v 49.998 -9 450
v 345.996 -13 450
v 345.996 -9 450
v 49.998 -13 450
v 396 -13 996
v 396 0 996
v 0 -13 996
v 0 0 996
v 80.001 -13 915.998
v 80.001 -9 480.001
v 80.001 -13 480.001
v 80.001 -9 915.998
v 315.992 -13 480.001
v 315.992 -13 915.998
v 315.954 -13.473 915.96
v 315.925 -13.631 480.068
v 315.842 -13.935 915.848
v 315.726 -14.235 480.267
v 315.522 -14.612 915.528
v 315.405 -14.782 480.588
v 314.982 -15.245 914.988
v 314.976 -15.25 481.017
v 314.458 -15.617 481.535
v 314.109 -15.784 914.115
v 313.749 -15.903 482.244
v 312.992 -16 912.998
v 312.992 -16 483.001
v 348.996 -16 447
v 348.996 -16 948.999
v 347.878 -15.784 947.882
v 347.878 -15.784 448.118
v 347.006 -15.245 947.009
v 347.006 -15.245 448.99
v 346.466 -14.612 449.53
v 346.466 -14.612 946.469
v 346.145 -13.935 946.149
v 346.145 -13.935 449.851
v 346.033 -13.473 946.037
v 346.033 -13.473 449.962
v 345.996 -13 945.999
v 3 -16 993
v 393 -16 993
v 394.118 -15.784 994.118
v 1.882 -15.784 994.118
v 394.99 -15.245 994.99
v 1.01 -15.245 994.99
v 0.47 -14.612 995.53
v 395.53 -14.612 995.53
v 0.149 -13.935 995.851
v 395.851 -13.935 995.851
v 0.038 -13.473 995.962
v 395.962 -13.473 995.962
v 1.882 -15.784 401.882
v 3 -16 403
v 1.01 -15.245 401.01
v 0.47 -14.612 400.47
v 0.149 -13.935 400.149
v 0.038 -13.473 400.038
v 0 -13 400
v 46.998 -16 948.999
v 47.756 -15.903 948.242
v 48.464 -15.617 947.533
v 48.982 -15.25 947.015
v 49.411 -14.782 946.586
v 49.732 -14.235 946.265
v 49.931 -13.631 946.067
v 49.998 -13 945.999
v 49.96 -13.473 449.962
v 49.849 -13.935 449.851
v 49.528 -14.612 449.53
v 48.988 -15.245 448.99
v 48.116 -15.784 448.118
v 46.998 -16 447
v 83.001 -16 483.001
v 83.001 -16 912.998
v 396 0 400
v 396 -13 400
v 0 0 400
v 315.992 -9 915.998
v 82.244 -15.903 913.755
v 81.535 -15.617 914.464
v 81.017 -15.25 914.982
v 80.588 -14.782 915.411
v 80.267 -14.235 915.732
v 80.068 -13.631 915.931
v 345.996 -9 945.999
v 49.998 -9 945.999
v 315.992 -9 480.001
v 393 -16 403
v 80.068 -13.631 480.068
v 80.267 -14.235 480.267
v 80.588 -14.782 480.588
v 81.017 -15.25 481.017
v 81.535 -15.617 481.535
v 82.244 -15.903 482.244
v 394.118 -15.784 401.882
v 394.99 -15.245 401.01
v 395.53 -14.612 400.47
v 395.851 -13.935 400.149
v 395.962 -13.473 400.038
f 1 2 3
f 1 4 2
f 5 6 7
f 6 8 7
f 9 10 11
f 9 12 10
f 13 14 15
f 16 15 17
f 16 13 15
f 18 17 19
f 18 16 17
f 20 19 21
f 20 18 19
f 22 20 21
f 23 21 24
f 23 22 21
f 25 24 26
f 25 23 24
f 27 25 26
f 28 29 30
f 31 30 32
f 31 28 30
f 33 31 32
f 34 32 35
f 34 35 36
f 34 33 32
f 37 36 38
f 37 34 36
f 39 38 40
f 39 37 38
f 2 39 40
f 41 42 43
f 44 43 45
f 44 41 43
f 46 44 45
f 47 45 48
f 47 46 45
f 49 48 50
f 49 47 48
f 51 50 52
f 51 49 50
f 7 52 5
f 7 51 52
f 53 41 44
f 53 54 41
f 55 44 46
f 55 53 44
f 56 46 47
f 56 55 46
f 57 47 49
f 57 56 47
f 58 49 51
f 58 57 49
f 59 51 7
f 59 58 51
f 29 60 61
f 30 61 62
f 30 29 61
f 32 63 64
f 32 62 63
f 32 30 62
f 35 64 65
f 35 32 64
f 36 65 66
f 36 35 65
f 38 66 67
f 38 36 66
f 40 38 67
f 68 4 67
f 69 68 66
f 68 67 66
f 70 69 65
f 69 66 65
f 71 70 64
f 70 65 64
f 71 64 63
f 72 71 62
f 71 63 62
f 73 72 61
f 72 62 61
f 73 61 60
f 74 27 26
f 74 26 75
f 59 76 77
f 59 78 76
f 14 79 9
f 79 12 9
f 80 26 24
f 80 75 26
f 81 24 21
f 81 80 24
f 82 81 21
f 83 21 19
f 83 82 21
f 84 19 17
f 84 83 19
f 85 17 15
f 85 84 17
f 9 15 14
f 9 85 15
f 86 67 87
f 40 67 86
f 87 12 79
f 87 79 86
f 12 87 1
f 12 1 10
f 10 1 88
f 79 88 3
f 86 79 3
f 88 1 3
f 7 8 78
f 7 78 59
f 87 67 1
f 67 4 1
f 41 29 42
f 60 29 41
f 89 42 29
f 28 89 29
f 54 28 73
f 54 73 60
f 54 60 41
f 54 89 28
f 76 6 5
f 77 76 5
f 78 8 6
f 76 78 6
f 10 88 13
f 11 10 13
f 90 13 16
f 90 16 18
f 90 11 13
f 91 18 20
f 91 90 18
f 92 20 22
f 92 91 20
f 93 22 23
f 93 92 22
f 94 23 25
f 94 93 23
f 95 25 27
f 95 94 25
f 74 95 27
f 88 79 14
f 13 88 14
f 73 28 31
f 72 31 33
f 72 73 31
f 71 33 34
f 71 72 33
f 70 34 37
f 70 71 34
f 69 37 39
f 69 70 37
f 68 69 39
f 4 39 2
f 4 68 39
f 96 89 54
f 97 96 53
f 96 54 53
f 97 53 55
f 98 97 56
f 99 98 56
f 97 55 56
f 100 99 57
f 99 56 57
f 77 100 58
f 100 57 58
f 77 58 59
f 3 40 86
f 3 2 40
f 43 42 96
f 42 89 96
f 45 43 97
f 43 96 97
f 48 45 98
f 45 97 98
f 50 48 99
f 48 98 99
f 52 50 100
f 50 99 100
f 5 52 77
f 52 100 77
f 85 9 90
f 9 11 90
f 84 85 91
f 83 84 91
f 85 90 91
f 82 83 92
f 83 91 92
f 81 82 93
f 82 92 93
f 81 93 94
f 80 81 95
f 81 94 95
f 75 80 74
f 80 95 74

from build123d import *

# Parameters (mm, degrees)
F0_W      = 44.656470418
F0_H      = 33.8078811765
F1_DEPTH  = 16
F2_DEPTH  = 796
F3_DEPTH  = 196
F4_W      = 68.9578056335
F4_H      = 493.6993122101
F5_DEPTH  = 7
F6_DEPTH  = 9.7
F7_DEPTH  = 99.33
F8_DEPTH  = 99.33
F9_DEPTH  = 17.34
F10_DEPTH = 102.97
F11_W     = 35.2807044983
F11_H     = 492.0964837074
F12_DEPTH = 7
F13_DEPTH = 37.27
F14_DEPTH = 6.58
F15_DEPTH = 106.63
F16_DEPTH = 5.87
F17_DEPTH = 200
F18_DEPTH = 200
F19_DEPTH = 200
F20_DEPTH = 600
F21_DEPTH = 600
F22_DEPTH = 600
F23_DEPTH = 200
F24_DEPTH = 200
F25_DEPTH = 200
F26_DEPTH = 200
F27_DEPTH = 200
F28_DEPTH = 200
F29_R     = 3


with BuildPart() as f1:
    # F0 (on Front) → F1 (new body)
    with BuildSketch(Plane.XZ):
        with Locations((22.328235209, 16.9039405882)):
            Rectangle(F0_W, F0_H)
    extrude(amount=F1_DEPTH)

    # F2 (add): a face of the model
    f2_faces = [f1.faces().sort_by_distance(p)[0] for p in [
        (22.328235209, -8, 0),
    ]]
    extrude(f2_faces, amount=-F2_DEPTH)

    # F3 (add): a face of the model
    f3_faces = [f1.faces().sort_by_distance(p)[0] for p in [
        (0, -8, 398),
    ]]
    extrude(f3_faces, amount=-F3_DEPTH)

    # F4 (on face) → F5 (cut)
    with BuildSketch(Plane.XZ.offset(16)):
        with Locations((94.1769480705, 399.8196721077)):
            Rectangle(F4_W, F4_H)
    extrude(amount=-F5_DEPTH, mode=Mode.SUBTRACT)

    # F6 (cut): a face of the model
    f6_faces = [f1.faces().sort_by_distance(p)[0] for p in [
        (59.6980452538, -12.5, 399.8196721077),
    ]]
    extrude(f6_faces, amount=-F6_DEPTH, mode=Mode.SUBTRACT)

    # F7 (add): a face of the model
    f7_faces = [f1.faces().sort_by_distance(p)[0] for p in [
        (89.3269480705, -12.5, 646.6693282127),
    ]]
    extrude(f7_faces, amount=-F7_DEPTH)

    # F8 (cut): a face of the model
    f8_faces = [f1.faces().sort_by_distance(p)[0] for p in [
        (89.3269480705, -12.5, 646.6693282127),
    ]]
    extrude(f8_faces, amount=-F8_DEPTH, mode=Mode.SUBTRACT)

    # F9 (cut): a face of the model
    f9_faces = [f1.faces().sort_by_distance(p)[0] for p in [
        (128.6558508873, -12.5, 449.4846721077),
    ]]
    extrude(f9_faces, amount=-F9_DEPTH, mode=Mode.SUBTRACT)

    # F10 (cut): a face of the model
    f10_faces = [f1.faces().sort_by_distance(p)[0] for p in [
        (97.9969480705, -12.5, 152.9700160027),
    ]]
    extrude(f10_faces, amount=-F10_DEPTH, mode=Mode.SUBTRACT)

    # F11 (on face) → F12 (join)
    with BuildSketch(Plane.XZ.offset(9)):
        with Locations((91.7714834213, 432.6795041561)):
            Rectangle(F11_W, F11_H)
    extrude(amount=F12_DEPTH)

    # F13 (add): a face of the model
    f13_faces = [f1.faces().sort_by_distance(p)[0] for p in [
        (91.7714834213, -12.5, 678.7277460098),
    ]]
    extrude(f13_faces, amount=F13_DEPTH)

    # F14 (add): a face of the model
    f14_faces = [f1.faces().sort_by_distance(p)[0] for p in [
        (109.4118356705, -12.5, 451.3145041561),
    ]]
    extrude(f14_faces, amount=F14_DEPTH)

    # F15 (add): a face of the model
    f15_faces = [f1.faces().sort_by_distance(p)[0] for p in [
        (95.0614834213, -12.5, 186.6312623024),
    ]]
    extrude(f15_faces, amount=F15_DEPTH)

    # F16 (cut): a face of the model
    f16_faces = [f1.faces().sort_by_distance(p)[0] for p in [
        (74.1311311722, -12.5, 397.9995041561),
    ]]
    extrude(f16_faces, amount=-F16_DEPTH, mode=Mode.SUBTRACT)

    # F17 (add): a face of the model
    f17_faces = [f1.faces().sort_by_distance(p)[0] for p in [
        (196, -8, 398),
    ]]
    extrude(f17_faces, amount=F17_DEPTH)

    # F18 (cut): a face of the model
    f18_faces = [f1.faces().sort_by_distance(p)[0] for p in [
        (145.9958508873, -12.5, 397.9996721077),
    ]]
    extrude(f18_faces, amount=-F18_DEPTH, mode=Mode.SUBTRACT)

    # F19 (add): a face of the model
    f19_faces = [f1.faces().sort_by_distance(p)[0] for p in [
        (115.9918356705, -12.5, 397.9995041561),
    ]]
    extrude(f19_faces, amount=F19_DEPTH)

    # F20 (cut): a face of the model
    f20_faces = [f1.faces().sort_by_distance(p)[0] for p in [
        (197.9964834213, -12.5, 80.0012623024),
    ]]
    extrude(f20_faces, amount=-F20_DEPTH, mode=Mode.SUBTRACT)

    # F21 (add): a face of the model
    f21_faces = [f1.faces().sort_by_distance(p)[0] for p in [
        (197.9969480705, -12.5, 50.0000160027),
    ]]
    extrude(f21_faces, amount=F21_DEPTH)

    # F22 (cut): a face of the model
    f22_faces = [f1.faces().sort_by_distance(p)[0] for p in [
        (198, -8, 0),
    ]]
    extrude(f22_faces, amount=-F22_DEPTH, mode=Mode.SUBTRACT)

    # F23 (add): a face of the model
    f23_faces = [f1.faces().sort_by_distance(p)[0] for p in [
        (198, -8, 600),
    ]]
    extrude(f23_faces, amount=F23_DEPTH)

    # F24 (cut): a face of the model
    f24_faces = [f1.faces().sort_by_distance(p)[0] for p in [
        (197.9969480705, -12.5, 650.0000160027),
    ]]
    extrude(f24_faces, amount=-F24_DEPTH, mode=Mode.SUBTRACT)

    # F25 (add): a face of the model
    f25_faces = [f1.faces().sort_by_distance(p)[0] for p in [
        (197.9964834213, -12.5, 680.0012623024),
    ]]
    extrude(f25_faces, amount=F25_DEPTH)

    # F26 (add): a face of the model
    f26_faces = [f1.faces().sort_by_distance(p)[0] for p in [
        (198, -8, 796),
    ]]
    extrude(f26_faces, amount=F26_DEPTH)

    # F27 (cut): a face of the model
    f27_faces = [f1.faces().sort_by_distance(p)[0] for p in [
        (197.9969480705, -12.5, 745.9993282127),
    ]]
    extrude(f27_faces, amount=-F27_DEPTH, mode=Mode.SUBTRACT)

    # F28 (add): a face of the model
    f28_faces = [f1.faces().sort_by_distance(p)[0] for p in [
        (197.9964834213, -12.5, 715.9977460098),
    ]]
    extrude(f28_faces, amount=F28_DEPTH)

    # F29
    f29_edges = [f1.edges().sort_by_distance(p)[0] for p in [
        (0, -16, 698),
        (198, -16, 400),
        (396, -16, 698),
        (198, -16, 996),
        (197.996948, -16, 450.000016),
        (49.998045, -16, 697.999672),
        (197.996948, -16, 945.999328),
        (345.995851, -16, 697.999672),
        (197.996483, -16, 480.001262),
        (80.001131, -16, 697.999504),
        (197.996483, -16, 915.997746),
        (315.991836, -16, 697.999504),
    ]]
    fillet(f29_edges, radius=F29_R)


solid = f1.part
